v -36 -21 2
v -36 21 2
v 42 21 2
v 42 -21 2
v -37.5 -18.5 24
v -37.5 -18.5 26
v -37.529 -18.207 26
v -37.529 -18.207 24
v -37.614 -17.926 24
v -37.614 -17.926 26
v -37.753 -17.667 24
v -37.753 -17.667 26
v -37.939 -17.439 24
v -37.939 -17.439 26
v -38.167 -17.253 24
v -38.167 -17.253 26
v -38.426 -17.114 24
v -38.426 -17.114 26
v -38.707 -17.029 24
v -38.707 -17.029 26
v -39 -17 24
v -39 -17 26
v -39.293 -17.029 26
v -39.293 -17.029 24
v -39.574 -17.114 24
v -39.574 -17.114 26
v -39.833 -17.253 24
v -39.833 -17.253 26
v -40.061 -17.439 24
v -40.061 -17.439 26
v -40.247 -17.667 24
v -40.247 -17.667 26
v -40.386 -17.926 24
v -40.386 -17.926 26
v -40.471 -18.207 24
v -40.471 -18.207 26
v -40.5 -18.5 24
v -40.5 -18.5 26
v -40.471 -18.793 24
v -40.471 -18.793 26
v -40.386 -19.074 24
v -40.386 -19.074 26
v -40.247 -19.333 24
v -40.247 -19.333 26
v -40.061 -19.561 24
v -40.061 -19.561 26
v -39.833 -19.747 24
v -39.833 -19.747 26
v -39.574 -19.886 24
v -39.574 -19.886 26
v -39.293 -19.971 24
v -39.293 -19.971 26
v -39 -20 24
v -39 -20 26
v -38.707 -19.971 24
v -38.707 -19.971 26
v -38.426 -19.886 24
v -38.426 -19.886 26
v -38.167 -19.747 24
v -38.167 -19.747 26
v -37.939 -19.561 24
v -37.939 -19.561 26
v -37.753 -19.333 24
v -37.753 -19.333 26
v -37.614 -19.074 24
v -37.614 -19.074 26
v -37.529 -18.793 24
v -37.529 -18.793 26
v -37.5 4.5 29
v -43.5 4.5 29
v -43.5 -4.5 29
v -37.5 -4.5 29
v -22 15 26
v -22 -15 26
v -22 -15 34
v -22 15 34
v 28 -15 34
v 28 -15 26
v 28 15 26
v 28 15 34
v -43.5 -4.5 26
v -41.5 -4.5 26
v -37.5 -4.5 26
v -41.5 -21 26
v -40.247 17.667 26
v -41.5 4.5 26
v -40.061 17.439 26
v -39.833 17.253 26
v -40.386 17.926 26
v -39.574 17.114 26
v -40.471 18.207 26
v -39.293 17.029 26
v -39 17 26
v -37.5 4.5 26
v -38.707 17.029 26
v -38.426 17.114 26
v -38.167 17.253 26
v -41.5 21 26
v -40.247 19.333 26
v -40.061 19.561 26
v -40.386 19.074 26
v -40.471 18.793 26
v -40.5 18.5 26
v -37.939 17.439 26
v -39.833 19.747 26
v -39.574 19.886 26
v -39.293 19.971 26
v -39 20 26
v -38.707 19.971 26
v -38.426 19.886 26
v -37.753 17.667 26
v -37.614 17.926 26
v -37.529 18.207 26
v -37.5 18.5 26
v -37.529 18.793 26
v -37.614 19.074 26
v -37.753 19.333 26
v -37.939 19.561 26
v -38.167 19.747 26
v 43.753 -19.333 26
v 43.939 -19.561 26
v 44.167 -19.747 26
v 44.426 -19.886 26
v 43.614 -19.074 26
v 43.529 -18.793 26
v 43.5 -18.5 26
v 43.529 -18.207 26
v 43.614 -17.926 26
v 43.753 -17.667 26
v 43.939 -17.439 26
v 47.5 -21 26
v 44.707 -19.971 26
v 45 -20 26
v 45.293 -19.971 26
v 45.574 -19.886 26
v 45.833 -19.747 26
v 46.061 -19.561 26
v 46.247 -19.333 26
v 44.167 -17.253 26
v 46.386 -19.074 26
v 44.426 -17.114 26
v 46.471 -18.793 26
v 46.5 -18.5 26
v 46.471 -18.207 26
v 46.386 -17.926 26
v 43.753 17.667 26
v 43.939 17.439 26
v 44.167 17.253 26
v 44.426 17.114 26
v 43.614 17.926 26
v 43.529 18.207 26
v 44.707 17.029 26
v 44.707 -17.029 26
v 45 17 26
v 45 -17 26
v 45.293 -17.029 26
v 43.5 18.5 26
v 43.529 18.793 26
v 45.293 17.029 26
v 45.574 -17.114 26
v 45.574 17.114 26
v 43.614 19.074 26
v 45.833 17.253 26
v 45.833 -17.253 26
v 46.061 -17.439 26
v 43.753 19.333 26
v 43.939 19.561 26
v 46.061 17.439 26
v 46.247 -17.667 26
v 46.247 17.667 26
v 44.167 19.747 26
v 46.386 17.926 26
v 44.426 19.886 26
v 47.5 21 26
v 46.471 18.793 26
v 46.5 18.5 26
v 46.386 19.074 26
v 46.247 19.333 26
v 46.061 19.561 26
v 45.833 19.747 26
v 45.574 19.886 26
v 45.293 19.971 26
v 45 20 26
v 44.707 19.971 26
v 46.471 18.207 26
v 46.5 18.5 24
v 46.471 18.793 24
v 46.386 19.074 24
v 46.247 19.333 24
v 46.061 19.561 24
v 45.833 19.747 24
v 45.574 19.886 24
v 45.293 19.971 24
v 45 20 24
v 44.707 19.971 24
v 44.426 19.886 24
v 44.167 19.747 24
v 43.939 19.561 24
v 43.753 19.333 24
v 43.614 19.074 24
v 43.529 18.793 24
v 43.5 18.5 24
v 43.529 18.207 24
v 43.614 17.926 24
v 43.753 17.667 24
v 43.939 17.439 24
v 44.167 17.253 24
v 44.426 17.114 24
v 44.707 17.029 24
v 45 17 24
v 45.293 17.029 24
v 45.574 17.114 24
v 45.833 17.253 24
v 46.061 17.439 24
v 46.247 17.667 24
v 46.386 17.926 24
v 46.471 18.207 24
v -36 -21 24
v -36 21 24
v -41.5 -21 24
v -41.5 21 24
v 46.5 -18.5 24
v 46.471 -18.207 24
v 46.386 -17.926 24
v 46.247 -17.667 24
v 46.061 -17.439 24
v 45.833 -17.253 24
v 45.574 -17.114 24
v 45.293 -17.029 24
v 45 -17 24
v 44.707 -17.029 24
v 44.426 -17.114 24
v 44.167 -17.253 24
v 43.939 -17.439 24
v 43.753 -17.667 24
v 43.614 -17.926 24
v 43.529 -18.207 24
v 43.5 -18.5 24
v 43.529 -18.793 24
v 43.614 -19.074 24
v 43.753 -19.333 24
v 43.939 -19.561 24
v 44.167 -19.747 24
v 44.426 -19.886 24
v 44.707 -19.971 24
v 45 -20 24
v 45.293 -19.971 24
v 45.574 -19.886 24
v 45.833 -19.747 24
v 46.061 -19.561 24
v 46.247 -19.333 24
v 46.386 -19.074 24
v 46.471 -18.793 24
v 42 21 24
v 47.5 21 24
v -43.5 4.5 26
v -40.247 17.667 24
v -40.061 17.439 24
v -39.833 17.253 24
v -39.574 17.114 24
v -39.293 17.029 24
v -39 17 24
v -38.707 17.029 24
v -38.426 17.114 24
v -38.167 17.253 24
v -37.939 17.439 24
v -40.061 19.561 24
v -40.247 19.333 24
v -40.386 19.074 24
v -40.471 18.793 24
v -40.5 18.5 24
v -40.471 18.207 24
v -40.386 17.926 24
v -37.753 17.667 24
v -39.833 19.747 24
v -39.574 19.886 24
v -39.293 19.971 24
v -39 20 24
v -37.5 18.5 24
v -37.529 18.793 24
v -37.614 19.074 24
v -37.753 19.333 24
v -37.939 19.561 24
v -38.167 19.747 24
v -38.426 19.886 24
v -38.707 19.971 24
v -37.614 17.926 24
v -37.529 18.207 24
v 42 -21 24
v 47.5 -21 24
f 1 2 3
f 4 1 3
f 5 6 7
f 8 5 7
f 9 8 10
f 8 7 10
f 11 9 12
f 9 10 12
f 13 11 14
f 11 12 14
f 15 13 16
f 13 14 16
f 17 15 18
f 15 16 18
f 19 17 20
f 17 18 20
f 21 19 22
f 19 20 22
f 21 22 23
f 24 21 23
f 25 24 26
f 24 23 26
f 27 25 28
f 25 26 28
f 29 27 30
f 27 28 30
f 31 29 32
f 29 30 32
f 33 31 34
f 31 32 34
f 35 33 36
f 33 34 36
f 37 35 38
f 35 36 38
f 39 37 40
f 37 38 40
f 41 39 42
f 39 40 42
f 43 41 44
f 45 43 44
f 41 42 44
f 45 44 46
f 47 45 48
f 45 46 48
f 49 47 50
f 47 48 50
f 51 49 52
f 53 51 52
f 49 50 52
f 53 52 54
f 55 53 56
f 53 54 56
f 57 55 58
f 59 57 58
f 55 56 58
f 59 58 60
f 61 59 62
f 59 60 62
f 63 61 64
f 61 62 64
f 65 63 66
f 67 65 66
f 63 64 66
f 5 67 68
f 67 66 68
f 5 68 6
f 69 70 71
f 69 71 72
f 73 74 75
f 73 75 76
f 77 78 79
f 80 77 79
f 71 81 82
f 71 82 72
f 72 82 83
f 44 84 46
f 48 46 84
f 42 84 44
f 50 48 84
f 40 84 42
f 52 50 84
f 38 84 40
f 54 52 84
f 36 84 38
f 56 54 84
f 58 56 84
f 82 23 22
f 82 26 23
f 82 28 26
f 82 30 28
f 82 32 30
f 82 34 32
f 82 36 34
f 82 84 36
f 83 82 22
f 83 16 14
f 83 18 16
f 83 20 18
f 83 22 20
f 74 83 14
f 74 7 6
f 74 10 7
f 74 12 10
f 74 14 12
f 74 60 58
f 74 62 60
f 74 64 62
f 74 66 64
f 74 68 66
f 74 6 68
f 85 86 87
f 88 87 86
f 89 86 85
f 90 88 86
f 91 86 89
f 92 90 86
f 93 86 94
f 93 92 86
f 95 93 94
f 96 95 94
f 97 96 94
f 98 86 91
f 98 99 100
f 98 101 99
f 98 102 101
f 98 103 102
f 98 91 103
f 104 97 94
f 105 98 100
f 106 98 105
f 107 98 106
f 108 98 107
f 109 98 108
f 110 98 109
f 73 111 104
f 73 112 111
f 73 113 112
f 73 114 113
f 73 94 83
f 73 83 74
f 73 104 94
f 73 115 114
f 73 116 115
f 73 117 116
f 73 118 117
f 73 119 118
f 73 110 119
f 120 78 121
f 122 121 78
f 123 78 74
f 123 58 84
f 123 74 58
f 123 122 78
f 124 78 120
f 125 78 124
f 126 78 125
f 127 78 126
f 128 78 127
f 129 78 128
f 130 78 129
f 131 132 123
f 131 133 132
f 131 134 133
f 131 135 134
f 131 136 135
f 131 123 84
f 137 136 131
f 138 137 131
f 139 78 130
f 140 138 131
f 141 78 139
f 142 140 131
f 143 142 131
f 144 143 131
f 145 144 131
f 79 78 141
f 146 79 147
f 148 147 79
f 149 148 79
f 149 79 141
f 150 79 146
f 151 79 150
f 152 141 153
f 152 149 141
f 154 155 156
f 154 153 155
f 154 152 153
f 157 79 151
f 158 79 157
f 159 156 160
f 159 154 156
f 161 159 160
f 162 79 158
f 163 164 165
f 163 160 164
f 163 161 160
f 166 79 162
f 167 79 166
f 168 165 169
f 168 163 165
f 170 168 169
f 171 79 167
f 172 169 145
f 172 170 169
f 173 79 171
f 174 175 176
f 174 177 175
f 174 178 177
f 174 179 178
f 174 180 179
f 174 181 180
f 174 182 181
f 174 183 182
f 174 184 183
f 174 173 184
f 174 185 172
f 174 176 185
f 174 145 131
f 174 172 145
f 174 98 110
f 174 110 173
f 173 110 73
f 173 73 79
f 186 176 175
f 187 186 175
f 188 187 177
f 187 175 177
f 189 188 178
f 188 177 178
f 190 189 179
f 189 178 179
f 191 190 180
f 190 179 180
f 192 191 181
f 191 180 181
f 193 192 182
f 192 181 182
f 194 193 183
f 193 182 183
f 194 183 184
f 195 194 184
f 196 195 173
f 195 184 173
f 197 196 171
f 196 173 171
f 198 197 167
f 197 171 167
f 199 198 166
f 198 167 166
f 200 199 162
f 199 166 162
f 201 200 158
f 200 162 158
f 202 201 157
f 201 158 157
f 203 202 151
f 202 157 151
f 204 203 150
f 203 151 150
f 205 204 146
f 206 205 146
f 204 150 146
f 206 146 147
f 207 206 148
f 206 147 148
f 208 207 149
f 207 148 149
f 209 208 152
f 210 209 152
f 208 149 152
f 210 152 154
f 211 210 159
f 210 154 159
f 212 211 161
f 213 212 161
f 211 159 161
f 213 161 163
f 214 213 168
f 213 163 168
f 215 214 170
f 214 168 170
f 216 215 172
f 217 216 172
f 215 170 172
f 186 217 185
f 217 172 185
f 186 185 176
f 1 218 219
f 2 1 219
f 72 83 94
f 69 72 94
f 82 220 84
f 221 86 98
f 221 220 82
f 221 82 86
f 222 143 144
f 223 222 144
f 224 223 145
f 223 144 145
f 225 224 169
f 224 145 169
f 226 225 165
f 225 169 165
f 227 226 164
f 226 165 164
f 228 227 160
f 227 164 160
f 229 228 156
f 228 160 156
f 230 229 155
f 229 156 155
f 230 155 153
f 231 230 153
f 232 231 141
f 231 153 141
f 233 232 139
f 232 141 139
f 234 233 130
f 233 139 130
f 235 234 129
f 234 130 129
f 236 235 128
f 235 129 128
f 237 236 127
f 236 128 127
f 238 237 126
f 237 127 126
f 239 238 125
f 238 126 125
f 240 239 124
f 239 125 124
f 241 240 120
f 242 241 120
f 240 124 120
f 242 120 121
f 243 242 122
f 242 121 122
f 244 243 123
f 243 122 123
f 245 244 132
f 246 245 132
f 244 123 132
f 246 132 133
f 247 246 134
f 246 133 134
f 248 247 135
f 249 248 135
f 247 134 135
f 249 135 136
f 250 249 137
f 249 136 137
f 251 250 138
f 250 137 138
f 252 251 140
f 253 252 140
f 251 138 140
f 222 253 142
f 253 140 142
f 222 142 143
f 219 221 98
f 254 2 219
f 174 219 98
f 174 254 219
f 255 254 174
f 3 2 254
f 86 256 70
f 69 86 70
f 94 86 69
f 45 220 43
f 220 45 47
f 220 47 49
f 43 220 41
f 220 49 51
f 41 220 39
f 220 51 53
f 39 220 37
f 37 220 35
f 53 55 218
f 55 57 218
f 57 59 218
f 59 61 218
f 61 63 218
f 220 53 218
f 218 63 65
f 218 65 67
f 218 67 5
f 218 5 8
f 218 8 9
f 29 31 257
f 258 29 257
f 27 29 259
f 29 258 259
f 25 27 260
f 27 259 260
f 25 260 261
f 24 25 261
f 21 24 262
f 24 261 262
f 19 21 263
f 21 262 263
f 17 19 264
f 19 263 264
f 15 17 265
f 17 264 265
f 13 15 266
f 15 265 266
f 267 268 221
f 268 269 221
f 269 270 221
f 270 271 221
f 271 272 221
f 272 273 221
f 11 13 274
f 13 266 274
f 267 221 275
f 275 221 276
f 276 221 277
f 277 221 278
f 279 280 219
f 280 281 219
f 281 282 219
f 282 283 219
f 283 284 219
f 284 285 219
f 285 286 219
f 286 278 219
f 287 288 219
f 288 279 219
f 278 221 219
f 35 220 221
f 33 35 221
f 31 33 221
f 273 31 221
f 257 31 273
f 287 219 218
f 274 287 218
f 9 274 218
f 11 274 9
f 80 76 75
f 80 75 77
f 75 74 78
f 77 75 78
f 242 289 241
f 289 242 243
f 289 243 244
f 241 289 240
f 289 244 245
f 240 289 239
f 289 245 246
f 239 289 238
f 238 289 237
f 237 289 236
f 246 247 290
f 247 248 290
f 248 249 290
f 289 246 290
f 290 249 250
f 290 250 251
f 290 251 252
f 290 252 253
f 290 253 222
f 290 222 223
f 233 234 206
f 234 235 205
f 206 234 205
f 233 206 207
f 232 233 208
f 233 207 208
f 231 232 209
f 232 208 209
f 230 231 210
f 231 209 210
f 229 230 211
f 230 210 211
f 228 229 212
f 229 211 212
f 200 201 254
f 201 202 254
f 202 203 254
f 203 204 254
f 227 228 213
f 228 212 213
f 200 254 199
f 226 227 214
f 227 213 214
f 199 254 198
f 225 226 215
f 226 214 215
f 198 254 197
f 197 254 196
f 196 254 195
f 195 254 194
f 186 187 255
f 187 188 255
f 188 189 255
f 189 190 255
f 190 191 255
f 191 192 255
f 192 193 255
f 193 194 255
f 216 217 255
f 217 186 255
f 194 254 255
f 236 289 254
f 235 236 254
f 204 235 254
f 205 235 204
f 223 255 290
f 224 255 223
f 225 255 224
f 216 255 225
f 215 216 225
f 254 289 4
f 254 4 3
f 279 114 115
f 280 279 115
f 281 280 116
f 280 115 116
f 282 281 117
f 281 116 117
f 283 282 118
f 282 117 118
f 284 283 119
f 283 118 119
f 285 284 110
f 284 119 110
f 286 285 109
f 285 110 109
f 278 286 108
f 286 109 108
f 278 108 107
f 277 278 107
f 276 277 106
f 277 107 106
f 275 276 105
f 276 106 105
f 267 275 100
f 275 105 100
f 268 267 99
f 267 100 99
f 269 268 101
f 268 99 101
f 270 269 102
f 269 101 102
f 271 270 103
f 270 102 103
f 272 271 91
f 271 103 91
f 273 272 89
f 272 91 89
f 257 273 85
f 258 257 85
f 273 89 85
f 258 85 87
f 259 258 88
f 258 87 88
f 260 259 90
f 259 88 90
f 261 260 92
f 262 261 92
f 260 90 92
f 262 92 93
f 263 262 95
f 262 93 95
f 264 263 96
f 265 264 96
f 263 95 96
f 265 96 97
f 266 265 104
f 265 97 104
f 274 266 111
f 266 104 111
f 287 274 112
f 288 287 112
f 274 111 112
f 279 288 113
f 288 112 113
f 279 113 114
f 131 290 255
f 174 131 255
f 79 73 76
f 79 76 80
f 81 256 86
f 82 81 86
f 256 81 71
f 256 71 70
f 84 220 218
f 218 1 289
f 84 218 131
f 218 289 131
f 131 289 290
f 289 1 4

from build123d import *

# Parameters (mm, degrees)
SKETCH_W     = 89
SKETCH_H     = 42
PAD_DEPTH    = 2
SKETCH001_W  = 50
SKETCH001_H  = 30
PAD001_DEPTH = 8
SKETCH002_R  = 1.5
POCKET_DEPTH = 2
SKETCH003_W  = 6
SKETCH003_H  = 9
PAD002_DEPTH = 3
SKETCH005_W  = 78
SKETCH005_H  = 42
PAD003_DEPTH = 22


with BuildPart() as part:
    # Sketch → Pad (new body)
    with BuildSketch(Plane.XY):
        Rectangle(SKETCH_W, SKETCH_H)
    extrude(amount=PAD_DEPTH)

    # Sketch001 (on Face6 of Pad) → Pad001 (join)
    with BuildSketch(Plane.XY.offset(2)):
        Rectangle(SKETCH001_W, SKETCH001_H)
    extrude(amount=PAD001_DEPTH)

    # Sketch002 (on Face5 of Pad001) → Pocket (cut)
    with BuildSketch(Plane.XY.offset(2)):
        with Locations((-42, 18.5)):
            Circle(SKETCH002_R)
        with Locations((42, 18.5)):
            Circle(SKETCH002_R)
        with Locations((-42, -18.5)):
            Circle(SKETCH002_R)
        with Locations((42, -18.5)):
            Circle(SKETCH002_R)
    extrude(amount=-POCKET_DEPTH, mode=Mode.SUBTRACT)

    # Sketch003 (on Face5 of Pocket) → Pad002 (join)
    with BuildSketch(Plane.XY.offset(2)):
        with Locations((-43.5, 0)):
            Rectangle(SKETCH003_W, SKETCH003_H)
    extrude(amount=PAD002_DEPTH)

    # Sketch005 → Pad003 (join)
    with BuildSketch(Plane.XY):
        Rectangle(SKETCH005_W, SKETCH005_H)
    extrude(amount=-PAD003_DEPTH)


with BuildPart() as part_1:
    # Body placement: moved
    add(part.part.moved(Location((3, 0, 24))))


solid = part_1.part
